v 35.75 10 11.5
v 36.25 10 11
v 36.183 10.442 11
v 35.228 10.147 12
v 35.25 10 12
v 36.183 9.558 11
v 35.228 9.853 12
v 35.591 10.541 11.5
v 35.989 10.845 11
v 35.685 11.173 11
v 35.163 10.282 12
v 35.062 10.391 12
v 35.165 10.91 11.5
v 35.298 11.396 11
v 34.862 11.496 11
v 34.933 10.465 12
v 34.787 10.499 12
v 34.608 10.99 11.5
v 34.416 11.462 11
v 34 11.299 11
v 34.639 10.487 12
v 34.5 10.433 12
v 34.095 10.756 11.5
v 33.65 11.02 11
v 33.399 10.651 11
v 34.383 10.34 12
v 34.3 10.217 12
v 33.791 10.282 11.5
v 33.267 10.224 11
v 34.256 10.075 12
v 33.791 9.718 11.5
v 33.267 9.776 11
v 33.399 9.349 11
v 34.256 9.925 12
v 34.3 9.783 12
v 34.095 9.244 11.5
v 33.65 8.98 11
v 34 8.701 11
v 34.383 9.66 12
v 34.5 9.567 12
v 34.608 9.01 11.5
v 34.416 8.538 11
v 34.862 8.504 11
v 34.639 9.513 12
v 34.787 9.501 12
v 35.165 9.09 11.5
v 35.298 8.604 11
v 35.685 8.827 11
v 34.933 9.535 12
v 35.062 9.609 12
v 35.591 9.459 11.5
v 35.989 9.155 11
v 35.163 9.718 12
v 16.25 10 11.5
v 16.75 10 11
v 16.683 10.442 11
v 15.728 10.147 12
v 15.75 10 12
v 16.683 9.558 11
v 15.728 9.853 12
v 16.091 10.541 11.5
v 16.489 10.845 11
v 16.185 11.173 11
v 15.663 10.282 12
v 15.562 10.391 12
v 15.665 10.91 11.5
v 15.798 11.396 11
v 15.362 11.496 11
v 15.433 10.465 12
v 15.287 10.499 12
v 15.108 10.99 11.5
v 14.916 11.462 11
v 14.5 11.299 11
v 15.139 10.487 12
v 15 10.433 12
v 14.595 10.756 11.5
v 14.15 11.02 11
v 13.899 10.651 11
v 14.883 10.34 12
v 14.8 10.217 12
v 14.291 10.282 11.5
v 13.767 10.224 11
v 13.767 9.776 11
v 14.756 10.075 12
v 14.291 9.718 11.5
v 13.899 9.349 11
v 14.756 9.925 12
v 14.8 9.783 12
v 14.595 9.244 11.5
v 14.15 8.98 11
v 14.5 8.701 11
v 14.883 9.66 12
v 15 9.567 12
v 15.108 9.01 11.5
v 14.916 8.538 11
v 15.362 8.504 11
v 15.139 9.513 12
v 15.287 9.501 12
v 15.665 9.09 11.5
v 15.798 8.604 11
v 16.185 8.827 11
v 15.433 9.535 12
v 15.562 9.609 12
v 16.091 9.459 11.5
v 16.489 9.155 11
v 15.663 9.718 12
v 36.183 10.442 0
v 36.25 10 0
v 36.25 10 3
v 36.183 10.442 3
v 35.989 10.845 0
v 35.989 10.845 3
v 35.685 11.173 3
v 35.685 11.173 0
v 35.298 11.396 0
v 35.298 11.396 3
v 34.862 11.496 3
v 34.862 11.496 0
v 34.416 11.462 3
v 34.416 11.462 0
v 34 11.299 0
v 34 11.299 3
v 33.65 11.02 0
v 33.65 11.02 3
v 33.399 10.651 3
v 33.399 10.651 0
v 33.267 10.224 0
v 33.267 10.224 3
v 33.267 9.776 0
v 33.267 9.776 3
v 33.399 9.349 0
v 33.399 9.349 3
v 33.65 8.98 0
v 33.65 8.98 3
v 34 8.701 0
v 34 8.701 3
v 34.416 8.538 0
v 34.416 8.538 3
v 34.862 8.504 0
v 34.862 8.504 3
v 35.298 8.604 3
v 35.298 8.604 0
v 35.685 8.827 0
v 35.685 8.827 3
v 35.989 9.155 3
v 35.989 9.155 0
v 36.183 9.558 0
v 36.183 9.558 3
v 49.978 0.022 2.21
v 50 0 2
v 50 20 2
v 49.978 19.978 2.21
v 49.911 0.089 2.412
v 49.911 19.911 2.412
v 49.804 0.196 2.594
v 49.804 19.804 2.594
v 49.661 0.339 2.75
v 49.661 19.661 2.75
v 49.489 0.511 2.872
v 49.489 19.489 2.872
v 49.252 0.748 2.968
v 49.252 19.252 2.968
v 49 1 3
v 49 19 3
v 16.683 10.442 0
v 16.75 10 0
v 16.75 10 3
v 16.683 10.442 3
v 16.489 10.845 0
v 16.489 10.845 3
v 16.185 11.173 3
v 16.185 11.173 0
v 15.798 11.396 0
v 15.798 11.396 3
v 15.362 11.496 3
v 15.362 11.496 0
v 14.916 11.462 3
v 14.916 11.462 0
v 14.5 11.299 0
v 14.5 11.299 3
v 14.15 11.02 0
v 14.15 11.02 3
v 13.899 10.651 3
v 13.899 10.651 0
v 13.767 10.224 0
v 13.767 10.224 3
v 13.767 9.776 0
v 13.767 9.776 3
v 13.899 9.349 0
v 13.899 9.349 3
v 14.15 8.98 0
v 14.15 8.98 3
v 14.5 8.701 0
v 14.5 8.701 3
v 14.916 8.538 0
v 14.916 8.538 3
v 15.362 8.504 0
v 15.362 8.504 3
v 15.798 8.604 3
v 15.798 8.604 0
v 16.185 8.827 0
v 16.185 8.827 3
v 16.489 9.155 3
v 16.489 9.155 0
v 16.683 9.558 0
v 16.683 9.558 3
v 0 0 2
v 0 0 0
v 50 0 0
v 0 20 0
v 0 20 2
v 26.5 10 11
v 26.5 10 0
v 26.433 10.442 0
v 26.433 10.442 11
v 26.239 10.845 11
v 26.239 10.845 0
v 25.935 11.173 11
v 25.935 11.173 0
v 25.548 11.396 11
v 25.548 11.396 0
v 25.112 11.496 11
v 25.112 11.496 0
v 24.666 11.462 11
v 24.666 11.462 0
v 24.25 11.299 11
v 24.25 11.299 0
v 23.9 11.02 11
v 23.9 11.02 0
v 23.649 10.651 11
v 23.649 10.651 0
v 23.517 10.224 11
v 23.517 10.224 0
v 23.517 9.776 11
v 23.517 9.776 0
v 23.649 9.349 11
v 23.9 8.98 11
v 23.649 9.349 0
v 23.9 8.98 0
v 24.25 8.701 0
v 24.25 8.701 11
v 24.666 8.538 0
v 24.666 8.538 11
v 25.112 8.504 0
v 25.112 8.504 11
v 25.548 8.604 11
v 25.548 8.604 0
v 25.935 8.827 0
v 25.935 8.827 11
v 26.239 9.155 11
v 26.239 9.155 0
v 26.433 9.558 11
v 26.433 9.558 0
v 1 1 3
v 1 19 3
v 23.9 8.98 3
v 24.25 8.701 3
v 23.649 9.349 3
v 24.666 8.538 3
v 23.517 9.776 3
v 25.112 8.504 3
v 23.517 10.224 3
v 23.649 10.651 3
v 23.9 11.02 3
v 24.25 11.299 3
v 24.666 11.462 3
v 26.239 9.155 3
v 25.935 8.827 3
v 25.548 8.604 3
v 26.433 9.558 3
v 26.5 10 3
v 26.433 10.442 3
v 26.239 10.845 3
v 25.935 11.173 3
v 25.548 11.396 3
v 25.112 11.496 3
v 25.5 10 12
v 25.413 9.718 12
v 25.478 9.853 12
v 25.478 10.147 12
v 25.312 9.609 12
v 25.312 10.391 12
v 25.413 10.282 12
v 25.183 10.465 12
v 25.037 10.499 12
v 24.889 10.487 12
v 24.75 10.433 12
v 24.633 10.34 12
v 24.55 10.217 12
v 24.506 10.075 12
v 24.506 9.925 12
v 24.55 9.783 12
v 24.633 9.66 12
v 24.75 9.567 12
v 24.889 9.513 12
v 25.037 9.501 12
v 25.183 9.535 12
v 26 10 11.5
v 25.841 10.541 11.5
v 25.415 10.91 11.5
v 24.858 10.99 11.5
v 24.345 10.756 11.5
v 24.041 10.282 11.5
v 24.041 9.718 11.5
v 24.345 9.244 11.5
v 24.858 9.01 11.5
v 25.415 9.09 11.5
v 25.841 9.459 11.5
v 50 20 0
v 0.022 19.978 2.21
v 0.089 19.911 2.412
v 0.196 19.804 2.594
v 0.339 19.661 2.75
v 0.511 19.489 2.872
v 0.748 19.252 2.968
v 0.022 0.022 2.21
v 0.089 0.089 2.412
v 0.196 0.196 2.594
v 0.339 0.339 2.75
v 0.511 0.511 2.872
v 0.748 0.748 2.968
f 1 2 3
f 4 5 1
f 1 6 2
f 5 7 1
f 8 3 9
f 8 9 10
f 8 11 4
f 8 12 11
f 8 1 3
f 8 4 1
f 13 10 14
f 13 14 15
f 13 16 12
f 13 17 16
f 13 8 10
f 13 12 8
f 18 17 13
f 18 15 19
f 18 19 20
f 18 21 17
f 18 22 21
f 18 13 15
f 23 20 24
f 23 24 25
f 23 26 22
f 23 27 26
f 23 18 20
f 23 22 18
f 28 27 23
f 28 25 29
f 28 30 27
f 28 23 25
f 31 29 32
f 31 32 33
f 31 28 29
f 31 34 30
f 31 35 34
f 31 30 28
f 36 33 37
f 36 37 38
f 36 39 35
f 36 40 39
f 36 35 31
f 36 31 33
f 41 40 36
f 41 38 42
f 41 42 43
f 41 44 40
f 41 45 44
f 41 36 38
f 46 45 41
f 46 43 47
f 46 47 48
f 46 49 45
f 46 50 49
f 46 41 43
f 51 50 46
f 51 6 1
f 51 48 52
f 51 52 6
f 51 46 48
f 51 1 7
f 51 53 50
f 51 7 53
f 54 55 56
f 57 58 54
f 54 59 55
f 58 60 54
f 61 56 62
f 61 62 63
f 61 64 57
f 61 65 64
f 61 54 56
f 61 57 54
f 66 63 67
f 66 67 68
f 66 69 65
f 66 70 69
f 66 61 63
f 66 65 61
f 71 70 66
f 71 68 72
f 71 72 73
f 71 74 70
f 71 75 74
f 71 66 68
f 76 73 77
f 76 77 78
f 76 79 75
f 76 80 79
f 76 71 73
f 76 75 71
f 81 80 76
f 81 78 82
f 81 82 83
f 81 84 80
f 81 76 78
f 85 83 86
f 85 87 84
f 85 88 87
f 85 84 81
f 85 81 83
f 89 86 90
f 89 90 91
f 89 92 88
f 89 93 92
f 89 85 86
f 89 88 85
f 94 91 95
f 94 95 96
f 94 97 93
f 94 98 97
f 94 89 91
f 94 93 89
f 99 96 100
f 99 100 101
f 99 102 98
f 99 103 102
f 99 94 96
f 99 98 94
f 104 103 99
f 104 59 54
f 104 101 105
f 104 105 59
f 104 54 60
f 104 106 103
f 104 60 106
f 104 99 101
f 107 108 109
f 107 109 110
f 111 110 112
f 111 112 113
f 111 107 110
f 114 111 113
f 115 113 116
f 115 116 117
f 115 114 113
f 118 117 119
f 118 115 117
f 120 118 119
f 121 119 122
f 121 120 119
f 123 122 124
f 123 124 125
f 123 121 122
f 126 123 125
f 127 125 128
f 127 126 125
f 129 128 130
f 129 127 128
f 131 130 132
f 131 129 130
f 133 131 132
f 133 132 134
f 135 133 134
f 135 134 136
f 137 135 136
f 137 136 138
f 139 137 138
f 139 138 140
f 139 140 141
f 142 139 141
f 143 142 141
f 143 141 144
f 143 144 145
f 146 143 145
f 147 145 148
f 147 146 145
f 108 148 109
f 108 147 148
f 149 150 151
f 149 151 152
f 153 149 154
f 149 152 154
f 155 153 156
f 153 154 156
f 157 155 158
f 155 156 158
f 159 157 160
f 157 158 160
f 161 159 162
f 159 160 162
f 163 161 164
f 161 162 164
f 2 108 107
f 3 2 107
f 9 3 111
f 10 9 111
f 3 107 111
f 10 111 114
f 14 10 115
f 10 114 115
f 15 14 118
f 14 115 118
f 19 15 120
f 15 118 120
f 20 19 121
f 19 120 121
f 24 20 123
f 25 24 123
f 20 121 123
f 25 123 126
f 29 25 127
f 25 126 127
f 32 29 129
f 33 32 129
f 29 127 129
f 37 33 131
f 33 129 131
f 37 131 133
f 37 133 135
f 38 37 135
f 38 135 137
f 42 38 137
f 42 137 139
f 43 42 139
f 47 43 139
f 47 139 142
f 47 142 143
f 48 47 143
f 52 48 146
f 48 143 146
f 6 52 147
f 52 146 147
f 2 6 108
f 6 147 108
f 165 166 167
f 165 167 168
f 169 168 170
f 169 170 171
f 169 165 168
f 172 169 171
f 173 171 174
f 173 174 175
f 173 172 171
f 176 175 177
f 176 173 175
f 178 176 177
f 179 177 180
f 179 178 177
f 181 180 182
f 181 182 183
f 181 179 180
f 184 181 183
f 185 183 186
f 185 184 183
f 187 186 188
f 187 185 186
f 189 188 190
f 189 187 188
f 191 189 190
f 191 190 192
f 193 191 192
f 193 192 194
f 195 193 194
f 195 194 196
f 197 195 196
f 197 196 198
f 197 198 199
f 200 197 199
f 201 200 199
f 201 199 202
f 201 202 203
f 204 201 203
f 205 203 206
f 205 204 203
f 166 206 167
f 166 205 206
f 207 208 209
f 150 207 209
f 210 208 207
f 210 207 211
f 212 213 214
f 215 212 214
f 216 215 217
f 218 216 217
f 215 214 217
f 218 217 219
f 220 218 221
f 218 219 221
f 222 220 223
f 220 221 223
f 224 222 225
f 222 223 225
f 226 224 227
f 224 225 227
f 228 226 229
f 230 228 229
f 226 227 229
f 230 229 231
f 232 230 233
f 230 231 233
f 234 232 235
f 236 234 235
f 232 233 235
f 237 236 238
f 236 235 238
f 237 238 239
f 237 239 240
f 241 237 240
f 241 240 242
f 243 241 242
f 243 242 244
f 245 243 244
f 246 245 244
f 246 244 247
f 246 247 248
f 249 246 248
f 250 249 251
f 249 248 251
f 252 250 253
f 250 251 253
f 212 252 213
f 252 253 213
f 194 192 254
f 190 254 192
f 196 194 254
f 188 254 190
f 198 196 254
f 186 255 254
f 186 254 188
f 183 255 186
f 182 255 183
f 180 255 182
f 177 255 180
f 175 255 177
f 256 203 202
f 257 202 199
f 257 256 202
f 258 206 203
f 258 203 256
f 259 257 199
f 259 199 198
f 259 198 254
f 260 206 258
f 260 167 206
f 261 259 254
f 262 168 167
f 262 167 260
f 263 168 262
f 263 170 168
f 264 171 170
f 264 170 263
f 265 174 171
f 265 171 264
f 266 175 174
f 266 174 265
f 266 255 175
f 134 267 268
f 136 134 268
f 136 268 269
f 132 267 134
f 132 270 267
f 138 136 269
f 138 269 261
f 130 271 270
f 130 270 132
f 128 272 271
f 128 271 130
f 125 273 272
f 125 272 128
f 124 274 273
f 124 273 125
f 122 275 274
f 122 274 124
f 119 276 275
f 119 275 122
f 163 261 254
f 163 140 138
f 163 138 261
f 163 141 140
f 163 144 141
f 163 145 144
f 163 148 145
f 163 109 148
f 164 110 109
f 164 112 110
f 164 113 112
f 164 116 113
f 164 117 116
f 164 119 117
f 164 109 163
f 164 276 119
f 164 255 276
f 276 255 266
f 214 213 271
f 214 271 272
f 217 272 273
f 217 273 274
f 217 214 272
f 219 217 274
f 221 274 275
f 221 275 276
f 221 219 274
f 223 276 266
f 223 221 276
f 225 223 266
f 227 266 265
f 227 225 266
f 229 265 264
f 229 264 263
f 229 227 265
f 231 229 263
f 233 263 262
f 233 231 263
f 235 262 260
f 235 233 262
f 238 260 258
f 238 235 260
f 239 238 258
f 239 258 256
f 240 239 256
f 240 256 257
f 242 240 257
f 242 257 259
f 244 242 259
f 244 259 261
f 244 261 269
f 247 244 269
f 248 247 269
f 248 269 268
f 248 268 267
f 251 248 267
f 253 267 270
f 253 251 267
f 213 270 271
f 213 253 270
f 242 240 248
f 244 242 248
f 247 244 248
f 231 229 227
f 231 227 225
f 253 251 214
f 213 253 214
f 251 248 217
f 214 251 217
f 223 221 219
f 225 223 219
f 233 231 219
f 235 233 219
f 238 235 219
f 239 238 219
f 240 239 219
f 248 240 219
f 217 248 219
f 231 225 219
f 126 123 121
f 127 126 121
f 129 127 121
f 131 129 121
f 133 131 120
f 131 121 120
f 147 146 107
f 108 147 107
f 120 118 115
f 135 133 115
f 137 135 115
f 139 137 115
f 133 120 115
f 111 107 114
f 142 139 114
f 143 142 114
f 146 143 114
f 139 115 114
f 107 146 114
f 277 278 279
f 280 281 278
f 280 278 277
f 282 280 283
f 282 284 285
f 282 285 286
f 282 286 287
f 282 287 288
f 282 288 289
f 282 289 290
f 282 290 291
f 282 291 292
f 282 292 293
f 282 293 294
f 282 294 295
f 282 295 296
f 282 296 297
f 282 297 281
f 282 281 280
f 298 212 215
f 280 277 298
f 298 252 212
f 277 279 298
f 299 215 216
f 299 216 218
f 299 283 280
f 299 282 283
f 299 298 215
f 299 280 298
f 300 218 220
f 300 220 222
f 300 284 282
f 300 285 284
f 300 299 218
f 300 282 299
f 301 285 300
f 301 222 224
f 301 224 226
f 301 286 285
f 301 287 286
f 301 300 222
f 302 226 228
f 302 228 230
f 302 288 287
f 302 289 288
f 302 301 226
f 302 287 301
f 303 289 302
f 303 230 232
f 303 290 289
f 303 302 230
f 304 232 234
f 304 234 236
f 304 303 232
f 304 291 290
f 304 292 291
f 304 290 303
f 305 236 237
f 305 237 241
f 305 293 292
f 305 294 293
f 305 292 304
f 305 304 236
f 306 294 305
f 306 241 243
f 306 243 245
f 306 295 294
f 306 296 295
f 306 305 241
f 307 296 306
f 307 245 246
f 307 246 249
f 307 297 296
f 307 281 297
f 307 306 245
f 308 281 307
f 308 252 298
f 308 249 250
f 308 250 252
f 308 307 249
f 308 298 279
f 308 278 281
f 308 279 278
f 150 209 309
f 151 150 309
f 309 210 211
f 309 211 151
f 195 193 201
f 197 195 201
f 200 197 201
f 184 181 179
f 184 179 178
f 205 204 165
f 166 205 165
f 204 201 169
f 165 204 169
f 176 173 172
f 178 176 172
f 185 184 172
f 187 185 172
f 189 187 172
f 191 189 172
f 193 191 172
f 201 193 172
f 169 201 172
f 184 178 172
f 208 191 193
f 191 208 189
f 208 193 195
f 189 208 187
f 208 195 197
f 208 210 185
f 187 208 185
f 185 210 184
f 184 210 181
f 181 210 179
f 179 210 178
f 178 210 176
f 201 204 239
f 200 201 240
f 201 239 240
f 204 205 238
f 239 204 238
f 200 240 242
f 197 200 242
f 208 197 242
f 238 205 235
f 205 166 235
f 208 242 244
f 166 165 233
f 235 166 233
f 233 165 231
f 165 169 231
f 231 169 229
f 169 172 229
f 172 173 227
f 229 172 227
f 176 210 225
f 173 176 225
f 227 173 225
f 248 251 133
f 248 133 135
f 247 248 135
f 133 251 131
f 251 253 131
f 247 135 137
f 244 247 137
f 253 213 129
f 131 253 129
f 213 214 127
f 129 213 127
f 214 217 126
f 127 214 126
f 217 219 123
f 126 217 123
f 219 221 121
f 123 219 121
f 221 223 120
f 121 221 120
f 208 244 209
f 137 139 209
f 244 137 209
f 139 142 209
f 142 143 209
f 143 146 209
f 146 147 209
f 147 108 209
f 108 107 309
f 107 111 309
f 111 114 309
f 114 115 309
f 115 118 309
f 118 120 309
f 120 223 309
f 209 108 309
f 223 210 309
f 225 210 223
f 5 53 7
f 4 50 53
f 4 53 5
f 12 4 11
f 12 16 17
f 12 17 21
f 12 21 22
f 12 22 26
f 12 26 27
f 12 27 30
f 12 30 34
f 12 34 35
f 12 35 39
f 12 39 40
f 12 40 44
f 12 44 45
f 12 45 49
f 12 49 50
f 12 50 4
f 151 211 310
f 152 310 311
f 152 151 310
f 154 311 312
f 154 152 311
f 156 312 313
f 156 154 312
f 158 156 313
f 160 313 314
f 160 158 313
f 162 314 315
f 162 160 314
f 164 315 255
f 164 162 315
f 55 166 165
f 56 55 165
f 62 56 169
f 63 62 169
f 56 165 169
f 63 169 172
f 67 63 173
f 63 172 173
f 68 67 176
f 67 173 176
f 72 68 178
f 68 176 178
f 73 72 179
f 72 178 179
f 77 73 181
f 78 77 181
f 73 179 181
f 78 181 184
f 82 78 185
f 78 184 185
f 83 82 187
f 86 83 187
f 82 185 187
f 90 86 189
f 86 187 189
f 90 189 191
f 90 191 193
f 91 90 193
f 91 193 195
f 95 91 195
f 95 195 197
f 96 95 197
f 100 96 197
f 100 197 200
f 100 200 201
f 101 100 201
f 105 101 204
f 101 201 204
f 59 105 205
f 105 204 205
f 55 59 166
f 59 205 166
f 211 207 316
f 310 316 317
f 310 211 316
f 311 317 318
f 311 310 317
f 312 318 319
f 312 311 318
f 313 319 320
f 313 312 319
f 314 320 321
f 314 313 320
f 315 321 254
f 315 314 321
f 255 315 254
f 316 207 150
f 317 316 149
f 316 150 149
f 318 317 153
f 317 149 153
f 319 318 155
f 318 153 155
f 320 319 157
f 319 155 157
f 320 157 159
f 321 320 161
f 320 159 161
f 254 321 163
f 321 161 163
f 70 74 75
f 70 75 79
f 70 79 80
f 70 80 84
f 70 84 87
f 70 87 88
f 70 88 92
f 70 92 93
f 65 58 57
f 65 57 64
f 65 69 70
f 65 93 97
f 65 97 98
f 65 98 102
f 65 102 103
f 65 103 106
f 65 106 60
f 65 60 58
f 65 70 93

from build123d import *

# Parameters (mm, degrees)
F0_R     = 1.5
F1_DEPTH = 12
F0_W     = 50
F0_H     = 20
F2_DEPTH = 3
F3_R     = 1
F4_SIZE  = 1


with BuildPart() as f1:
    # F0 (on Top) → F1 (new body)
    with BuildSketch(Plane.XY):
        with Locations((34.75, 10)):
            Circle(F0_R)
        with Locations((25, 10)):
            Circle(F0_R)
        with Locations((15.25, 10)):
            Circle(F0_R)
    extrude(amount=F1_DEPTH)

    # F4
    f4_edges = [f1.edges().sort_by_distance(p)[0] for p in [
        (33.25, 10, 12),
        (23.5, 10, 12),
        (13.75, 10, 12),
    ]]
    chamfer(f4_edges, length=F4_SIZE)


with BuildPart() as f2:
    # F0 (on Top) → F2 (new body)
    with BuildSketch(Plane.XY):
        with Locations((25, 10)):
            Rectangle(F0_W, F0_H)
        with Locations((15.25, 10)):
            Circle(F0_R, mode=Mode.SUBTRACT)
        with Locations((25, 10)):
            Circle(F0_R, mode=Mode.SUBTRACT)
        with Locations((34.75, 10)):
            Circle(F0_R, mode=Mode.SUBTRACT)
    extrude(amount=F2_DEPTH)

    # F3
    f3_edges = [f2.edges().sort_by_distance(p)[0] for p in [
        (25, 0, 3),
        (0, 10, 3),
        (25, 20, 3),
        (50, 10, 3),
    ]]
    fillet(f3_edges, radius=F3_R)


solid = Compound([f1.part, f2.part])
